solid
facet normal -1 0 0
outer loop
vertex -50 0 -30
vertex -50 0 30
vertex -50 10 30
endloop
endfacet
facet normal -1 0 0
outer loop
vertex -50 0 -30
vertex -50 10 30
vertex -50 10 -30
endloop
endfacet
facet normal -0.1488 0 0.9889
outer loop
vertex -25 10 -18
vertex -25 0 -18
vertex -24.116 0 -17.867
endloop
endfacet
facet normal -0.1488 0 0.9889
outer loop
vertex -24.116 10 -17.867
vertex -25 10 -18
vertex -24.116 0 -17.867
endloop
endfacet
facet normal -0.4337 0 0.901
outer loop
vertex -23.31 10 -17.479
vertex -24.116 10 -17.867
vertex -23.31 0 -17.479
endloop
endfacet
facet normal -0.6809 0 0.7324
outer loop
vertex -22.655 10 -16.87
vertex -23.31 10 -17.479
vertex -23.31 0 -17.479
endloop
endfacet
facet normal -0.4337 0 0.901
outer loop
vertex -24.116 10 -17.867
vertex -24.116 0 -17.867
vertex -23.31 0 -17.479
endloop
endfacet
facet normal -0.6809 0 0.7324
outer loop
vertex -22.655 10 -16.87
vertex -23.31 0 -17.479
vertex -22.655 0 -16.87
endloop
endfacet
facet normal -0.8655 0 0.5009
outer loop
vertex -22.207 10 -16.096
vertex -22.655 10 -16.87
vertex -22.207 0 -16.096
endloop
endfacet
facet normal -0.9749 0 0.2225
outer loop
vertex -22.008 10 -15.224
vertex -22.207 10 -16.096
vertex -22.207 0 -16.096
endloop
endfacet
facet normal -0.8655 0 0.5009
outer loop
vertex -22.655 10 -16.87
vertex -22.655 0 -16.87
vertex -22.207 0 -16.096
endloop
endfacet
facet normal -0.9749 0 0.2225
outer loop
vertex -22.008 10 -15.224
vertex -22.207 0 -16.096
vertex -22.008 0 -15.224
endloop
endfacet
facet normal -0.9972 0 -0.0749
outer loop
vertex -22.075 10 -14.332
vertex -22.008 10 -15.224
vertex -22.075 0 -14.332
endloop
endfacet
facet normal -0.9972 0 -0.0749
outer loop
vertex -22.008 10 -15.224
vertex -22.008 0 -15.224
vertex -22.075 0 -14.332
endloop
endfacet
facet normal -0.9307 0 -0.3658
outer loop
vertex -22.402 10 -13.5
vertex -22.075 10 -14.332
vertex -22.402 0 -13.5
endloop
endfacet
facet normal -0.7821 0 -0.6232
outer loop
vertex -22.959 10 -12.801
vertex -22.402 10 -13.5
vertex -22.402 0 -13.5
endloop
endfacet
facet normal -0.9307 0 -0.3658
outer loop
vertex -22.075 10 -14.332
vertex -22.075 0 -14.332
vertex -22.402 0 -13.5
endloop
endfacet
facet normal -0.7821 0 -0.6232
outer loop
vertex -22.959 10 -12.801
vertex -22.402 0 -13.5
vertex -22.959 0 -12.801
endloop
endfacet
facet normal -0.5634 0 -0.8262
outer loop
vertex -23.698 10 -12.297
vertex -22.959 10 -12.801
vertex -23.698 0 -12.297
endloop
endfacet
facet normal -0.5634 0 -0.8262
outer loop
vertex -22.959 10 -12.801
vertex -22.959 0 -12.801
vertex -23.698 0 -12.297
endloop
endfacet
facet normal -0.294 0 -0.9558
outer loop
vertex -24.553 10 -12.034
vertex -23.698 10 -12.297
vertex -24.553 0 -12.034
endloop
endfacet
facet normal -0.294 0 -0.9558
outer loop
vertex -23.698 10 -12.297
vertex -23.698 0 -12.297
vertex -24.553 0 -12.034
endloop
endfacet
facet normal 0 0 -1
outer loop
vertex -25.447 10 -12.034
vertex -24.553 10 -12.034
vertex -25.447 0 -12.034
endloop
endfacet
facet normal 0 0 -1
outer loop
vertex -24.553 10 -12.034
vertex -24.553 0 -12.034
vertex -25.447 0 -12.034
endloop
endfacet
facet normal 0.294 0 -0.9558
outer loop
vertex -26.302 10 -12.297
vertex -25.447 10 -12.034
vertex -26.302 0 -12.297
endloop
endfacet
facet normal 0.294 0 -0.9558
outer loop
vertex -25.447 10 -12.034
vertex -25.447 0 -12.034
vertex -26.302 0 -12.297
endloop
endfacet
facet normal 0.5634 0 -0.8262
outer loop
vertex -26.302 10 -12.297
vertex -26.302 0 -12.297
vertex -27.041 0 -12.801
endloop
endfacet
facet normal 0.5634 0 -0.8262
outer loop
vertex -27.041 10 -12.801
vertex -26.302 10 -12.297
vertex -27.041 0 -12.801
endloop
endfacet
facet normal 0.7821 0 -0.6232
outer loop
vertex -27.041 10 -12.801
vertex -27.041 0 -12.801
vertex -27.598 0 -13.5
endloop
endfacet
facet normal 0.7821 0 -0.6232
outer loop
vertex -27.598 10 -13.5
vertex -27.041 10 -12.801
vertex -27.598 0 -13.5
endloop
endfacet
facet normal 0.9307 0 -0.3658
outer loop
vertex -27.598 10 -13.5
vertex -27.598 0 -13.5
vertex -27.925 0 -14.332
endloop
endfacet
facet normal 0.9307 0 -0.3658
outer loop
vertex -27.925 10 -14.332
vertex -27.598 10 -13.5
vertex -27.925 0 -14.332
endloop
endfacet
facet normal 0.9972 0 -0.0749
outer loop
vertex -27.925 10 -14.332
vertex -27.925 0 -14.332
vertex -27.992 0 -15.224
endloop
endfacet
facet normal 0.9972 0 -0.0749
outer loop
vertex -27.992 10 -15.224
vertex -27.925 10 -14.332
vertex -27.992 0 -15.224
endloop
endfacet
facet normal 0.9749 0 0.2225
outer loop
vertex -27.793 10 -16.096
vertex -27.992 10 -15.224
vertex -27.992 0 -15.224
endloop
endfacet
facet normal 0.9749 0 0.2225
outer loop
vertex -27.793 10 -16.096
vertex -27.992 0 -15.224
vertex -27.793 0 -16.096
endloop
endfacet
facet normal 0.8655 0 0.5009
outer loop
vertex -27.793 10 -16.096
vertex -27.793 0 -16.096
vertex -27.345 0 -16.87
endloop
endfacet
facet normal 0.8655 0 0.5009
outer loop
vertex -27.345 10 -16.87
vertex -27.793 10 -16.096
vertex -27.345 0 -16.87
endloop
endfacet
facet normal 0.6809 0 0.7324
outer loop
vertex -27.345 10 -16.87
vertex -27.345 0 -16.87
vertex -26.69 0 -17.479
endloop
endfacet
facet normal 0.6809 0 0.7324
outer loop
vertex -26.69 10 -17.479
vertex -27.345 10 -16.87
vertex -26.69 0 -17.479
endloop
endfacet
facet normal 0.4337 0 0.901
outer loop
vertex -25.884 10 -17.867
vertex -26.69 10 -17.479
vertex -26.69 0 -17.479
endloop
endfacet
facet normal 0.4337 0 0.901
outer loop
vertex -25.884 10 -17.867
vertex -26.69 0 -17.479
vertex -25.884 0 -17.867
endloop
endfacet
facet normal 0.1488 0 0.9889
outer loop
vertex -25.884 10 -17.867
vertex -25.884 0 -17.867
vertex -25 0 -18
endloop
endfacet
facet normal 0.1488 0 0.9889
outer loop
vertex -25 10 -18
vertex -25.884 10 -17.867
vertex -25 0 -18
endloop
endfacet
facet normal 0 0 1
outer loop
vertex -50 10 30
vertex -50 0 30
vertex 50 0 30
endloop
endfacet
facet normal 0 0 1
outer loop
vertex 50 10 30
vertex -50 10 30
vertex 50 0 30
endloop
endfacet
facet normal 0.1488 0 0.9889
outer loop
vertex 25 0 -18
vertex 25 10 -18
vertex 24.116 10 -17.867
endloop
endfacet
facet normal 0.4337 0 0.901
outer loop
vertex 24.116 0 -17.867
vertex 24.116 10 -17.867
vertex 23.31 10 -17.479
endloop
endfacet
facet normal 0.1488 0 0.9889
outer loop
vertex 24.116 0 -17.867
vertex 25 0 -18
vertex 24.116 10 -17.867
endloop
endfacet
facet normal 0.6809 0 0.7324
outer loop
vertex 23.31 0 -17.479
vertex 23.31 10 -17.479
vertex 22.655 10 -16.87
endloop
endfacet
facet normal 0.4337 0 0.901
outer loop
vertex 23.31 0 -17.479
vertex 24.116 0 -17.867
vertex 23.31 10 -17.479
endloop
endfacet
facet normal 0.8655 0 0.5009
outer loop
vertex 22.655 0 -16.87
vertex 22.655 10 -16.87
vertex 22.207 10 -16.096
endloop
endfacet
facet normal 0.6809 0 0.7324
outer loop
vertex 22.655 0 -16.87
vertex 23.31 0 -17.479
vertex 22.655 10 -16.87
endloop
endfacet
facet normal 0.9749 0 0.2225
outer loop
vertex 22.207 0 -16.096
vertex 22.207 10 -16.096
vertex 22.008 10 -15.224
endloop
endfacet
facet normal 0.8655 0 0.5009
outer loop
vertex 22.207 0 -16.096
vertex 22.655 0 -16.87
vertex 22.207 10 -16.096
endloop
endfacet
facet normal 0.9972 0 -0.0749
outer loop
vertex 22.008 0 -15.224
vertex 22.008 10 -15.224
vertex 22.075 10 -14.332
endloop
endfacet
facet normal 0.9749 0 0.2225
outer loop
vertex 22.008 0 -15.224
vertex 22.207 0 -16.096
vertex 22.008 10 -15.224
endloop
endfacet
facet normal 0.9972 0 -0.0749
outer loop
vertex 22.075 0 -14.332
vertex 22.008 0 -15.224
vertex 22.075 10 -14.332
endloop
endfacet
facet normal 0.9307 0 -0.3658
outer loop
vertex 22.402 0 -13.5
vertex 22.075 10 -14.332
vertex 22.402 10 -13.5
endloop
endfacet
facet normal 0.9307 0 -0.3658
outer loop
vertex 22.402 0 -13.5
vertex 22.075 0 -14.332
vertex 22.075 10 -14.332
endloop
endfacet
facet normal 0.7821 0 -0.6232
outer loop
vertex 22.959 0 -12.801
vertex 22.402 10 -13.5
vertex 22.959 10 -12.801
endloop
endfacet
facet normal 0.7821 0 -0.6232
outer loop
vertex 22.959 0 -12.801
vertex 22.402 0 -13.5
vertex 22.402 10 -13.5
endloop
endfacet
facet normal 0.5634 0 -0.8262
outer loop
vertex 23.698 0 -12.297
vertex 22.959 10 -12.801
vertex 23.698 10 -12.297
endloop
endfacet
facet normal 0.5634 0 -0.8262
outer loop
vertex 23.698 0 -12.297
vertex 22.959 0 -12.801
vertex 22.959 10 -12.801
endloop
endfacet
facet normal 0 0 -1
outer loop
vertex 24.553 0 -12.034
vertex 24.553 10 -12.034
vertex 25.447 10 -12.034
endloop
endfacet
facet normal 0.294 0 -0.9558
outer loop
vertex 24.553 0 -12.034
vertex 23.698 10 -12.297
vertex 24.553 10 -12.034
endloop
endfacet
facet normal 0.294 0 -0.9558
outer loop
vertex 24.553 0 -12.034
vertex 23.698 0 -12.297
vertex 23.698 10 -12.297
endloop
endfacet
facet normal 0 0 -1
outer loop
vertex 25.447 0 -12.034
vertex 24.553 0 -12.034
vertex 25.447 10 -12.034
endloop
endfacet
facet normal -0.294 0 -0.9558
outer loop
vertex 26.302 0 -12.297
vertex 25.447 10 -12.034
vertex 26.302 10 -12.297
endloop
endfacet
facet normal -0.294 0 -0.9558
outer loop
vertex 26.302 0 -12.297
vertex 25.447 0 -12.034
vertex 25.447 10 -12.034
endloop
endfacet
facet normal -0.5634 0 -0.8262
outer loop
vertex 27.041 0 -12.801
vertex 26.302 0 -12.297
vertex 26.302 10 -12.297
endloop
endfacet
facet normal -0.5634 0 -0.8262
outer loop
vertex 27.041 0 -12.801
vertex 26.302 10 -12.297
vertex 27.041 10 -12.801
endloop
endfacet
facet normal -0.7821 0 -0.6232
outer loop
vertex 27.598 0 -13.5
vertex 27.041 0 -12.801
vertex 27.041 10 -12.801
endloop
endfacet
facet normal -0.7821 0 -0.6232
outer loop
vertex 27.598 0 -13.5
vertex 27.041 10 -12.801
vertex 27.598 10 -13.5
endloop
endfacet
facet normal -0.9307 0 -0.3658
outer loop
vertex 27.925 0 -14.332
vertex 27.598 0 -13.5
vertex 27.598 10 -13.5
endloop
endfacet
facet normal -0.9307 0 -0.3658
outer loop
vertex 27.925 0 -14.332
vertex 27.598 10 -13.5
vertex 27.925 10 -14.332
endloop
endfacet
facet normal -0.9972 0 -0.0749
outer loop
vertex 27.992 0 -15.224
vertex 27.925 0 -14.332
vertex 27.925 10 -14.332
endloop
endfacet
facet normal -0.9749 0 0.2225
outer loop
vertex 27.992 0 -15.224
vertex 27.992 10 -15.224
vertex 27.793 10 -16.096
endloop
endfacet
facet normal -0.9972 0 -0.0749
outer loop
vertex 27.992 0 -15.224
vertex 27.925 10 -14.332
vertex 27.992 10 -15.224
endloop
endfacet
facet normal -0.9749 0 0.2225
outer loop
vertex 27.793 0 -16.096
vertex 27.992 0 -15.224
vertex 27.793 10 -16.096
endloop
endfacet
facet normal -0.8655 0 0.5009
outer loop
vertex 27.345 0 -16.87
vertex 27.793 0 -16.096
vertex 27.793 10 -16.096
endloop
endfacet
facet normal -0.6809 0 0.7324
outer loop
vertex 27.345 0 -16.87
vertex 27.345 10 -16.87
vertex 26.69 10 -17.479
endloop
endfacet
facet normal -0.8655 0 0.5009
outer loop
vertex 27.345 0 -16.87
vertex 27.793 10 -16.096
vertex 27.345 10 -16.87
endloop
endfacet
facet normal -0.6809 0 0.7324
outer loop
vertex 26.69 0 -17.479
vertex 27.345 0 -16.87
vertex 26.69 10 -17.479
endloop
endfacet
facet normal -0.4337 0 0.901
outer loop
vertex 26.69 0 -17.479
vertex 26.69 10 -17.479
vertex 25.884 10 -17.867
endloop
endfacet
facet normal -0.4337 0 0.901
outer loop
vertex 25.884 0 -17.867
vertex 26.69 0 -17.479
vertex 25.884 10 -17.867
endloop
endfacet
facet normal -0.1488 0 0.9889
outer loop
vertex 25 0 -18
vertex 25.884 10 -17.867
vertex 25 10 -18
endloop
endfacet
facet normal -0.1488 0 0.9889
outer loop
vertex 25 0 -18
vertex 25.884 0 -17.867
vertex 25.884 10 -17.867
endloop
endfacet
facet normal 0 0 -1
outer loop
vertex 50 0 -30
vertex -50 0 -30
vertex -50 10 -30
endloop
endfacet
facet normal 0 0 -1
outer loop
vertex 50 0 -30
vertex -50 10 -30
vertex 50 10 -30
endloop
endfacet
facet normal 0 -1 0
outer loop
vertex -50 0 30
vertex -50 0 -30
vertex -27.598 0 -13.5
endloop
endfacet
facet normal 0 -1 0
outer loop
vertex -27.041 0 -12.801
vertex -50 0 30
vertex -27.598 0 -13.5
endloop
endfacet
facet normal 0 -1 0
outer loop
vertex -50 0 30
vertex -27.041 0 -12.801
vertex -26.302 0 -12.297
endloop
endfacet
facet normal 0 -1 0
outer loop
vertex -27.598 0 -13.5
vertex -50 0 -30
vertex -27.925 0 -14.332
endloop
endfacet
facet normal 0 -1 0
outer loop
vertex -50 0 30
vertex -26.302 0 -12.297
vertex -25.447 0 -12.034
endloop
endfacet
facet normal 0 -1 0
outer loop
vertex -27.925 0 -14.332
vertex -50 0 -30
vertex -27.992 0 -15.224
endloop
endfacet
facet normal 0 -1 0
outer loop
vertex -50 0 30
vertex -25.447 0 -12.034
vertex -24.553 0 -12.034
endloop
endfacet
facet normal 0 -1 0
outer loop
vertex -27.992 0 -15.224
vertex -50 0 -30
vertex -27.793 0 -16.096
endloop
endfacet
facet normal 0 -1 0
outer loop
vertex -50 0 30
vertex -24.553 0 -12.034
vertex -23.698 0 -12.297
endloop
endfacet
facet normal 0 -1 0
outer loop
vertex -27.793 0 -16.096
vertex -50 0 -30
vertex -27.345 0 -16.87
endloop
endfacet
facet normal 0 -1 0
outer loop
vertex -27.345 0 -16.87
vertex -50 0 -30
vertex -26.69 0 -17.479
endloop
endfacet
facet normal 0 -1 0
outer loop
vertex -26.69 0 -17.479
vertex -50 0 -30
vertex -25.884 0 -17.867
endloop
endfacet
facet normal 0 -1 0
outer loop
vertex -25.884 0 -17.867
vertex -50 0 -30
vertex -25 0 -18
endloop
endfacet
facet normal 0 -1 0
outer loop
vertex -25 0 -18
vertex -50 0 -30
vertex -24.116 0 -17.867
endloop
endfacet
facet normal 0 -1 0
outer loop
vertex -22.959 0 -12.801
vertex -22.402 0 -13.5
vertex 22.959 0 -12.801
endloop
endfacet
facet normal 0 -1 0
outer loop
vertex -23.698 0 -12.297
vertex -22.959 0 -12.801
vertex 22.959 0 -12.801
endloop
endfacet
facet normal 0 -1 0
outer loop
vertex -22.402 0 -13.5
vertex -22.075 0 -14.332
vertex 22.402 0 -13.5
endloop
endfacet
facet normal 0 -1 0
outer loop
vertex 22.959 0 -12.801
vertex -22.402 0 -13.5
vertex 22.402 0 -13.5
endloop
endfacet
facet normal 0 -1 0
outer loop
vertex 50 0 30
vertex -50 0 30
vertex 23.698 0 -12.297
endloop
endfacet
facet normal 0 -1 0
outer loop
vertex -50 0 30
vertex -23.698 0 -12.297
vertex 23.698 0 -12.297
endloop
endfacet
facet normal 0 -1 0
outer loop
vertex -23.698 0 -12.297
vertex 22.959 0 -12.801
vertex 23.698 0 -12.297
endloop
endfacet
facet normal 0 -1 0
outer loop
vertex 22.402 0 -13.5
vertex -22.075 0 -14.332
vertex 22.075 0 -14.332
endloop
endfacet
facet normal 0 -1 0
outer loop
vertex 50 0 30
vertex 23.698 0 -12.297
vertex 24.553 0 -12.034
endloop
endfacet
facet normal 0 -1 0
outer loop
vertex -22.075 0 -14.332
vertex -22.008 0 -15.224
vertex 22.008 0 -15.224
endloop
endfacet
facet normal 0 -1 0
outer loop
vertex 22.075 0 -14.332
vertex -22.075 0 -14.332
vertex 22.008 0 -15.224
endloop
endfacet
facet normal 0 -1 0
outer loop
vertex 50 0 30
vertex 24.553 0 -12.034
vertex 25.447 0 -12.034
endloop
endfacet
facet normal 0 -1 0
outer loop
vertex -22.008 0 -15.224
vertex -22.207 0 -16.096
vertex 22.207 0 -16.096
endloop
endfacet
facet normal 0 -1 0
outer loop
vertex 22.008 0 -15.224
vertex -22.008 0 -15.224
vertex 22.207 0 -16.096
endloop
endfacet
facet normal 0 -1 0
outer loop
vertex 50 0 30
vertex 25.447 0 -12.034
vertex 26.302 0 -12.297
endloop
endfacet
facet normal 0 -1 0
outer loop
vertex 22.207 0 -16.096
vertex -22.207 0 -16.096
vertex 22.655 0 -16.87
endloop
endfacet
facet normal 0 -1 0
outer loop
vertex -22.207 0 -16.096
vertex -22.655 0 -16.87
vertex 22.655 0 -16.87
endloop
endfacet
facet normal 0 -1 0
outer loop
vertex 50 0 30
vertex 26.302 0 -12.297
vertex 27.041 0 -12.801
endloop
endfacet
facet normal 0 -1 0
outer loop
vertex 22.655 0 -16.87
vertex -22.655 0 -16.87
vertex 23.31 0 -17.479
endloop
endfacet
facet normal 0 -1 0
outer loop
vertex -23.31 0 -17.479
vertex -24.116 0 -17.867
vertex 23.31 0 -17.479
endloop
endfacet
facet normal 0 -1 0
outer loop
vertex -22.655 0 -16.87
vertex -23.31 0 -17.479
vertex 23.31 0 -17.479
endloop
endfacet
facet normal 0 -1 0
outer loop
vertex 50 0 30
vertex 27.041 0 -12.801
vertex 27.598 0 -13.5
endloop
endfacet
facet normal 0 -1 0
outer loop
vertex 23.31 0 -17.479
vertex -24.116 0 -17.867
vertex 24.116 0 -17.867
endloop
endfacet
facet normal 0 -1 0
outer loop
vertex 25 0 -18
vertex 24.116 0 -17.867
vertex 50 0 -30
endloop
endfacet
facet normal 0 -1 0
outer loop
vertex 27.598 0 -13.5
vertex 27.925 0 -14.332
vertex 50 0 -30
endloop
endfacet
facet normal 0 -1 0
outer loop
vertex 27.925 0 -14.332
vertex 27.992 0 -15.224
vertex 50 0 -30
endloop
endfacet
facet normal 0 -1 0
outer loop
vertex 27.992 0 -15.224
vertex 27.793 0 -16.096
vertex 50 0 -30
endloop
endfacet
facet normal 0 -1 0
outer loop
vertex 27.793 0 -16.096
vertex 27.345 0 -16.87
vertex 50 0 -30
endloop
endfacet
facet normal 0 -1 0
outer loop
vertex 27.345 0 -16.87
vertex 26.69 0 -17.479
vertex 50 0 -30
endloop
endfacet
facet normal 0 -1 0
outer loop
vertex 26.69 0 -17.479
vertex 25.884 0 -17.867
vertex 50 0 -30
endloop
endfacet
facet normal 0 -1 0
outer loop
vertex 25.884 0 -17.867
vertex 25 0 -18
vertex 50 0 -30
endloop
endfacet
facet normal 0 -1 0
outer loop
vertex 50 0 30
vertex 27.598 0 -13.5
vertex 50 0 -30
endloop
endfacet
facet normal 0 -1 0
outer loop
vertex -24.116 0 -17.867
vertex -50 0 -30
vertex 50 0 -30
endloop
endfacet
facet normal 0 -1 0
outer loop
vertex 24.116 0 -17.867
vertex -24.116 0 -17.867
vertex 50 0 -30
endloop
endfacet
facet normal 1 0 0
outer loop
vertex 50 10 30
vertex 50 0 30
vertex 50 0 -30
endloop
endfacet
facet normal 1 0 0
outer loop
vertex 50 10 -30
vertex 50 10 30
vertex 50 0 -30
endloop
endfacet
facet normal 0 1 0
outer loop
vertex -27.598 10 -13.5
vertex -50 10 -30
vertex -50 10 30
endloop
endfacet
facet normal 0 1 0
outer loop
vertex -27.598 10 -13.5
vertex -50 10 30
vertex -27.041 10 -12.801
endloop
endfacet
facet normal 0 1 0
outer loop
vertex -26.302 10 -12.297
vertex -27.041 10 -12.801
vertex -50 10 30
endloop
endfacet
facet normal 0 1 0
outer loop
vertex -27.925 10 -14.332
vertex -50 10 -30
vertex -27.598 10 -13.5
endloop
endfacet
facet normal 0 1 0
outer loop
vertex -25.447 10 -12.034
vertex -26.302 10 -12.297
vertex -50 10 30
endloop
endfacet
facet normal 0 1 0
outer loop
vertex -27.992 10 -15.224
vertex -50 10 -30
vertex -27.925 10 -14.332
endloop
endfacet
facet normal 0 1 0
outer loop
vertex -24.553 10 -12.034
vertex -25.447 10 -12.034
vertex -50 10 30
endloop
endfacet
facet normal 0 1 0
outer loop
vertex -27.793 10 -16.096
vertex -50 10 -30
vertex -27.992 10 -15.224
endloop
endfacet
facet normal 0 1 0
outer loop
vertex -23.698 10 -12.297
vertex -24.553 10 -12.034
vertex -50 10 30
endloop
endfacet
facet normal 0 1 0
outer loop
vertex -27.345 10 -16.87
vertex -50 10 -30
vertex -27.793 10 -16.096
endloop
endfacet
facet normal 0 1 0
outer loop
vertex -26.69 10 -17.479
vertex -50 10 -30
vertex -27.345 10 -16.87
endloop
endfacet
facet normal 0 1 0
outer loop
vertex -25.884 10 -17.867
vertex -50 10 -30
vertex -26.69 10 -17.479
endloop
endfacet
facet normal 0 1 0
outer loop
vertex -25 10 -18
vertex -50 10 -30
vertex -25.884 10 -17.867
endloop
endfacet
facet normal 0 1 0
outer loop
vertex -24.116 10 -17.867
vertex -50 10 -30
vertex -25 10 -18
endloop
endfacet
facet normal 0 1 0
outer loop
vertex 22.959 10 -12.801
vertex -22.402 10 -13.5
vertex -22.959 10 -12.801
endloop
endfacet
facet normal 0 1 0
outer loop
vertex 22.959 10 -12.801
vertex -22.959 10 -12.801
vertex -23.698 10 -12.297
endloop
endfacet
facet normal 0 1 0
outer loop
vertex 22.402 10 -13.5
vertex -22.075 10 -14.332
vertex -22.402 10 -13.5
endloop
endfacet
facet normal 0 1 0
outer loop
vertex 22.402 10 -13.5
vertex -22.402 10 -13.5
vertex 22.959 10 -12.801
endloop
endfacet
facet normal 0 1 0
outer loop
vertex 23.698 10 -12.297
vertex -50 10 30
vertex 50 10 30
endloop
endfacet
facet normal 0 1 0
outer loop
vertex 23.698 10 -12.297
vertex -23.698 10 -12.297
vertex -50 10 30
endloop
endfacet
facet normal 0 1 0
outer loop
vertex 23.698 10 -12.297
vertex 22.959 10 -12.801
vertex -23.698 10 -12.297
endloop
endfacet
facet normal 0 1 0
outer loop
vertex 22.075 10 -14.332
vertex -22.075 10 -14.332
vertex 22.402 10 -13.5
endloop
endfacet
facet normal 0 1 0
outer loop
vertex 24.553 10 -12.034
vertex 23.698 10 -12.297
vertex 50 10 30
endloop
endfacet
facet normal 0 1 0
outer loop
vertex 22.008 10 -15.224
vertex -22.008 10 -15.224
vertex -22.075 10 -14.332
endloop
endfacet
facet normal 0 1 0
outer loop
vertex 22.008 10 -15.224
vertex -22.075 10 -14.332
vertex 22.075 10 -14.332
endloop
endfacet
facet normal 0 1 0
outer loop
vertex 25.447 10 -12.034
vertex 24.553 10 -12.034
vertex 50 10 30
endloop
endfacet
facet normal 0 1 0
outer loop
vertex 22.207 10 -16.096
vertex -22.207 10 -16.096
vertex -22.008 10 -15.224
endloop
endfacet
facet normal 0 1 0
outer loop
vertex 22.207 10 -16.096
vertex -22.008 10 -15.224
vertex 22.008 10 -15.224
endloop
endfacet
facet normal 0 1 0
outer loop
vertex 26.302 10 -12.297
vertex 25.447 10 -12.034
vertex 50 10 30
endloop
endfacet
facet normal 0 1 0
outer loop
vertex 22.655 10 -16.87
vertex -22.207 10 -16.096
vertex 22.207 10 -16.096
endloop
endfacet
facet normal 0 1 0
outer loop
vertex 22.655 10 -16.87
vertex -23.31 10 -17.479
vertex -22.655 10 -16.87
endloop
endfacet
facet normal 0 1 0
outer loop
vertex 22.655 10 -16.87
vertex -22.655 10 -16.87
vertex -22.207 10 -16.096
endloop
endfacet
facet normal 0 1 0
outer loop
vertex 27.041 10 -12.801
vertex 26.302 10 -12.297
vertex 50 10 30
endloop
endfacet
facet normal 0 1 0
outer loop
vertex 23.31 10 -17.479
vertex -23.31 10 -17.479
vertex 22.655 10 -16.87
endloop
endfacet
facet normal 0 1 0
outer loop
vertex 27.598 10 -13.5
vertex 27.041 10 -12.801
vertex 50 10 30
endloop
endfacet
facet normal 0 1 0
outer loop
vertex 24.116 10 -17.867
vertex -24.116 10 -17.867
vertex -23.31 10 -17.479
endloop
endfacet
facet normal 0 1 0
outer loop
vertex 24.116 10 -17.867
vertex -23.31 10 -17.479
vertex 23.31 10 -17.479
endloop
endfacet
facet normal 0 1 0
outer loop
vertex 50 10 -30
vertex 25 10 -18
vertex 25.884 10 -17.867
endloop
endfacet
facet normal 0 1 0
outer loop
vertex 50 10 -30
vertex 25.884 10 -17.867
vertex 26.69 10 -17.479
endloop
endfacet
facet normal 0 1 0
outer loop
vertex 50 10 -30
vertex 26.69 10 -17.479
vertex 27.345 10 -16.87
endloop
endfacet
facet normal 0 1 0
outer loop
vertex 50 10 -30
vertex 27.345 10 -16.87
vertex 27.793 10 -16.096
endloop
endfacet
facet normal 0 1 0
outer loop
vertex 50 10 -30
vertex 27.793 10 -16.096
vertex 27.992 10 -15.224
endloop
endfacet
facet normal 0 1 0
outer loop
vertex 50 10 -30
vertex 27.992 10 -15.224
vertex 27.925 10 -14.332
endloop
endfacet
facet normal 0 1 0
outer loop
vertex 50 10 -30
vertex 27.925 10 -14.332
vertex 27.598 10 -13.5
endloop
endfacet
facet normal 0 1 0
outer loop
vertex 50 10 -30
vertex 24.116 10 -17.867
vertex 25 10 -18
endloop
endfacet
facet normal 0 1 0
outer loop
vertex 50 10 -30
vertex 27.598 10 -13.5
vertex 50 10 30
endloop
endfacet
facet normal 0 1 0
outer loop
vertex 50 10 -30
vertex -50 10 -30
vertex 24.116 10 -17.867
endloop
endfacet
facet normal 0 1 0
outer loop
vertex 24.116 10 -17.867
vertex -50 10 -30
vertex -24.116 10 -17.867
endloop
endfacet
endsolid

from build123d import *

# Parameters (mm, degrees)
SKETCH_1_W          = 100
SKETCH_1_H          = 60
EXTRUDE_1_DEPTH     = 10
SKETCH_2_R          = 3
CUT_EXTRUDE_1_DEPTH = 20


with BuildPart() as part:
    # 草图1 → 凸台-拉伸1 (new body)
    with BuildSketch(Plane(origin=(0, 0, 0), x_dir=(1, 0, 0), z_dir=(0, 1, 0))):
        Rectangle(SKETCH_1_W, SKETCH_1_H)
    extrude(amount=EXTRUDE_1_DEPTH)

    # 草图2 → 切除-拉伸1 (cut)
    with BuildSketch(Plane(origin=(0, 0, 0), x_dir=(1, 0, 0), z_dir=(0, 1, 0))):
        with Locations(Location((25, 15, 0), (0, 0, 90))):
            Circle(SKETCH_2_R)
    cut_extrude_1 = extrude(amount=CUT_EXTRUDE_1_DEPTH, mode=Mode.SUBTRACT)

    # 镜向1: 切除-拉伸1 across plane
    add(cut_extrude_1.mirror(Plane(origin=(0, 0, 0), x_dir=(0, 0, 1), z_dir=(1, 0, 0))), mode=Mode.SUBTRACT)


solid = part.part
